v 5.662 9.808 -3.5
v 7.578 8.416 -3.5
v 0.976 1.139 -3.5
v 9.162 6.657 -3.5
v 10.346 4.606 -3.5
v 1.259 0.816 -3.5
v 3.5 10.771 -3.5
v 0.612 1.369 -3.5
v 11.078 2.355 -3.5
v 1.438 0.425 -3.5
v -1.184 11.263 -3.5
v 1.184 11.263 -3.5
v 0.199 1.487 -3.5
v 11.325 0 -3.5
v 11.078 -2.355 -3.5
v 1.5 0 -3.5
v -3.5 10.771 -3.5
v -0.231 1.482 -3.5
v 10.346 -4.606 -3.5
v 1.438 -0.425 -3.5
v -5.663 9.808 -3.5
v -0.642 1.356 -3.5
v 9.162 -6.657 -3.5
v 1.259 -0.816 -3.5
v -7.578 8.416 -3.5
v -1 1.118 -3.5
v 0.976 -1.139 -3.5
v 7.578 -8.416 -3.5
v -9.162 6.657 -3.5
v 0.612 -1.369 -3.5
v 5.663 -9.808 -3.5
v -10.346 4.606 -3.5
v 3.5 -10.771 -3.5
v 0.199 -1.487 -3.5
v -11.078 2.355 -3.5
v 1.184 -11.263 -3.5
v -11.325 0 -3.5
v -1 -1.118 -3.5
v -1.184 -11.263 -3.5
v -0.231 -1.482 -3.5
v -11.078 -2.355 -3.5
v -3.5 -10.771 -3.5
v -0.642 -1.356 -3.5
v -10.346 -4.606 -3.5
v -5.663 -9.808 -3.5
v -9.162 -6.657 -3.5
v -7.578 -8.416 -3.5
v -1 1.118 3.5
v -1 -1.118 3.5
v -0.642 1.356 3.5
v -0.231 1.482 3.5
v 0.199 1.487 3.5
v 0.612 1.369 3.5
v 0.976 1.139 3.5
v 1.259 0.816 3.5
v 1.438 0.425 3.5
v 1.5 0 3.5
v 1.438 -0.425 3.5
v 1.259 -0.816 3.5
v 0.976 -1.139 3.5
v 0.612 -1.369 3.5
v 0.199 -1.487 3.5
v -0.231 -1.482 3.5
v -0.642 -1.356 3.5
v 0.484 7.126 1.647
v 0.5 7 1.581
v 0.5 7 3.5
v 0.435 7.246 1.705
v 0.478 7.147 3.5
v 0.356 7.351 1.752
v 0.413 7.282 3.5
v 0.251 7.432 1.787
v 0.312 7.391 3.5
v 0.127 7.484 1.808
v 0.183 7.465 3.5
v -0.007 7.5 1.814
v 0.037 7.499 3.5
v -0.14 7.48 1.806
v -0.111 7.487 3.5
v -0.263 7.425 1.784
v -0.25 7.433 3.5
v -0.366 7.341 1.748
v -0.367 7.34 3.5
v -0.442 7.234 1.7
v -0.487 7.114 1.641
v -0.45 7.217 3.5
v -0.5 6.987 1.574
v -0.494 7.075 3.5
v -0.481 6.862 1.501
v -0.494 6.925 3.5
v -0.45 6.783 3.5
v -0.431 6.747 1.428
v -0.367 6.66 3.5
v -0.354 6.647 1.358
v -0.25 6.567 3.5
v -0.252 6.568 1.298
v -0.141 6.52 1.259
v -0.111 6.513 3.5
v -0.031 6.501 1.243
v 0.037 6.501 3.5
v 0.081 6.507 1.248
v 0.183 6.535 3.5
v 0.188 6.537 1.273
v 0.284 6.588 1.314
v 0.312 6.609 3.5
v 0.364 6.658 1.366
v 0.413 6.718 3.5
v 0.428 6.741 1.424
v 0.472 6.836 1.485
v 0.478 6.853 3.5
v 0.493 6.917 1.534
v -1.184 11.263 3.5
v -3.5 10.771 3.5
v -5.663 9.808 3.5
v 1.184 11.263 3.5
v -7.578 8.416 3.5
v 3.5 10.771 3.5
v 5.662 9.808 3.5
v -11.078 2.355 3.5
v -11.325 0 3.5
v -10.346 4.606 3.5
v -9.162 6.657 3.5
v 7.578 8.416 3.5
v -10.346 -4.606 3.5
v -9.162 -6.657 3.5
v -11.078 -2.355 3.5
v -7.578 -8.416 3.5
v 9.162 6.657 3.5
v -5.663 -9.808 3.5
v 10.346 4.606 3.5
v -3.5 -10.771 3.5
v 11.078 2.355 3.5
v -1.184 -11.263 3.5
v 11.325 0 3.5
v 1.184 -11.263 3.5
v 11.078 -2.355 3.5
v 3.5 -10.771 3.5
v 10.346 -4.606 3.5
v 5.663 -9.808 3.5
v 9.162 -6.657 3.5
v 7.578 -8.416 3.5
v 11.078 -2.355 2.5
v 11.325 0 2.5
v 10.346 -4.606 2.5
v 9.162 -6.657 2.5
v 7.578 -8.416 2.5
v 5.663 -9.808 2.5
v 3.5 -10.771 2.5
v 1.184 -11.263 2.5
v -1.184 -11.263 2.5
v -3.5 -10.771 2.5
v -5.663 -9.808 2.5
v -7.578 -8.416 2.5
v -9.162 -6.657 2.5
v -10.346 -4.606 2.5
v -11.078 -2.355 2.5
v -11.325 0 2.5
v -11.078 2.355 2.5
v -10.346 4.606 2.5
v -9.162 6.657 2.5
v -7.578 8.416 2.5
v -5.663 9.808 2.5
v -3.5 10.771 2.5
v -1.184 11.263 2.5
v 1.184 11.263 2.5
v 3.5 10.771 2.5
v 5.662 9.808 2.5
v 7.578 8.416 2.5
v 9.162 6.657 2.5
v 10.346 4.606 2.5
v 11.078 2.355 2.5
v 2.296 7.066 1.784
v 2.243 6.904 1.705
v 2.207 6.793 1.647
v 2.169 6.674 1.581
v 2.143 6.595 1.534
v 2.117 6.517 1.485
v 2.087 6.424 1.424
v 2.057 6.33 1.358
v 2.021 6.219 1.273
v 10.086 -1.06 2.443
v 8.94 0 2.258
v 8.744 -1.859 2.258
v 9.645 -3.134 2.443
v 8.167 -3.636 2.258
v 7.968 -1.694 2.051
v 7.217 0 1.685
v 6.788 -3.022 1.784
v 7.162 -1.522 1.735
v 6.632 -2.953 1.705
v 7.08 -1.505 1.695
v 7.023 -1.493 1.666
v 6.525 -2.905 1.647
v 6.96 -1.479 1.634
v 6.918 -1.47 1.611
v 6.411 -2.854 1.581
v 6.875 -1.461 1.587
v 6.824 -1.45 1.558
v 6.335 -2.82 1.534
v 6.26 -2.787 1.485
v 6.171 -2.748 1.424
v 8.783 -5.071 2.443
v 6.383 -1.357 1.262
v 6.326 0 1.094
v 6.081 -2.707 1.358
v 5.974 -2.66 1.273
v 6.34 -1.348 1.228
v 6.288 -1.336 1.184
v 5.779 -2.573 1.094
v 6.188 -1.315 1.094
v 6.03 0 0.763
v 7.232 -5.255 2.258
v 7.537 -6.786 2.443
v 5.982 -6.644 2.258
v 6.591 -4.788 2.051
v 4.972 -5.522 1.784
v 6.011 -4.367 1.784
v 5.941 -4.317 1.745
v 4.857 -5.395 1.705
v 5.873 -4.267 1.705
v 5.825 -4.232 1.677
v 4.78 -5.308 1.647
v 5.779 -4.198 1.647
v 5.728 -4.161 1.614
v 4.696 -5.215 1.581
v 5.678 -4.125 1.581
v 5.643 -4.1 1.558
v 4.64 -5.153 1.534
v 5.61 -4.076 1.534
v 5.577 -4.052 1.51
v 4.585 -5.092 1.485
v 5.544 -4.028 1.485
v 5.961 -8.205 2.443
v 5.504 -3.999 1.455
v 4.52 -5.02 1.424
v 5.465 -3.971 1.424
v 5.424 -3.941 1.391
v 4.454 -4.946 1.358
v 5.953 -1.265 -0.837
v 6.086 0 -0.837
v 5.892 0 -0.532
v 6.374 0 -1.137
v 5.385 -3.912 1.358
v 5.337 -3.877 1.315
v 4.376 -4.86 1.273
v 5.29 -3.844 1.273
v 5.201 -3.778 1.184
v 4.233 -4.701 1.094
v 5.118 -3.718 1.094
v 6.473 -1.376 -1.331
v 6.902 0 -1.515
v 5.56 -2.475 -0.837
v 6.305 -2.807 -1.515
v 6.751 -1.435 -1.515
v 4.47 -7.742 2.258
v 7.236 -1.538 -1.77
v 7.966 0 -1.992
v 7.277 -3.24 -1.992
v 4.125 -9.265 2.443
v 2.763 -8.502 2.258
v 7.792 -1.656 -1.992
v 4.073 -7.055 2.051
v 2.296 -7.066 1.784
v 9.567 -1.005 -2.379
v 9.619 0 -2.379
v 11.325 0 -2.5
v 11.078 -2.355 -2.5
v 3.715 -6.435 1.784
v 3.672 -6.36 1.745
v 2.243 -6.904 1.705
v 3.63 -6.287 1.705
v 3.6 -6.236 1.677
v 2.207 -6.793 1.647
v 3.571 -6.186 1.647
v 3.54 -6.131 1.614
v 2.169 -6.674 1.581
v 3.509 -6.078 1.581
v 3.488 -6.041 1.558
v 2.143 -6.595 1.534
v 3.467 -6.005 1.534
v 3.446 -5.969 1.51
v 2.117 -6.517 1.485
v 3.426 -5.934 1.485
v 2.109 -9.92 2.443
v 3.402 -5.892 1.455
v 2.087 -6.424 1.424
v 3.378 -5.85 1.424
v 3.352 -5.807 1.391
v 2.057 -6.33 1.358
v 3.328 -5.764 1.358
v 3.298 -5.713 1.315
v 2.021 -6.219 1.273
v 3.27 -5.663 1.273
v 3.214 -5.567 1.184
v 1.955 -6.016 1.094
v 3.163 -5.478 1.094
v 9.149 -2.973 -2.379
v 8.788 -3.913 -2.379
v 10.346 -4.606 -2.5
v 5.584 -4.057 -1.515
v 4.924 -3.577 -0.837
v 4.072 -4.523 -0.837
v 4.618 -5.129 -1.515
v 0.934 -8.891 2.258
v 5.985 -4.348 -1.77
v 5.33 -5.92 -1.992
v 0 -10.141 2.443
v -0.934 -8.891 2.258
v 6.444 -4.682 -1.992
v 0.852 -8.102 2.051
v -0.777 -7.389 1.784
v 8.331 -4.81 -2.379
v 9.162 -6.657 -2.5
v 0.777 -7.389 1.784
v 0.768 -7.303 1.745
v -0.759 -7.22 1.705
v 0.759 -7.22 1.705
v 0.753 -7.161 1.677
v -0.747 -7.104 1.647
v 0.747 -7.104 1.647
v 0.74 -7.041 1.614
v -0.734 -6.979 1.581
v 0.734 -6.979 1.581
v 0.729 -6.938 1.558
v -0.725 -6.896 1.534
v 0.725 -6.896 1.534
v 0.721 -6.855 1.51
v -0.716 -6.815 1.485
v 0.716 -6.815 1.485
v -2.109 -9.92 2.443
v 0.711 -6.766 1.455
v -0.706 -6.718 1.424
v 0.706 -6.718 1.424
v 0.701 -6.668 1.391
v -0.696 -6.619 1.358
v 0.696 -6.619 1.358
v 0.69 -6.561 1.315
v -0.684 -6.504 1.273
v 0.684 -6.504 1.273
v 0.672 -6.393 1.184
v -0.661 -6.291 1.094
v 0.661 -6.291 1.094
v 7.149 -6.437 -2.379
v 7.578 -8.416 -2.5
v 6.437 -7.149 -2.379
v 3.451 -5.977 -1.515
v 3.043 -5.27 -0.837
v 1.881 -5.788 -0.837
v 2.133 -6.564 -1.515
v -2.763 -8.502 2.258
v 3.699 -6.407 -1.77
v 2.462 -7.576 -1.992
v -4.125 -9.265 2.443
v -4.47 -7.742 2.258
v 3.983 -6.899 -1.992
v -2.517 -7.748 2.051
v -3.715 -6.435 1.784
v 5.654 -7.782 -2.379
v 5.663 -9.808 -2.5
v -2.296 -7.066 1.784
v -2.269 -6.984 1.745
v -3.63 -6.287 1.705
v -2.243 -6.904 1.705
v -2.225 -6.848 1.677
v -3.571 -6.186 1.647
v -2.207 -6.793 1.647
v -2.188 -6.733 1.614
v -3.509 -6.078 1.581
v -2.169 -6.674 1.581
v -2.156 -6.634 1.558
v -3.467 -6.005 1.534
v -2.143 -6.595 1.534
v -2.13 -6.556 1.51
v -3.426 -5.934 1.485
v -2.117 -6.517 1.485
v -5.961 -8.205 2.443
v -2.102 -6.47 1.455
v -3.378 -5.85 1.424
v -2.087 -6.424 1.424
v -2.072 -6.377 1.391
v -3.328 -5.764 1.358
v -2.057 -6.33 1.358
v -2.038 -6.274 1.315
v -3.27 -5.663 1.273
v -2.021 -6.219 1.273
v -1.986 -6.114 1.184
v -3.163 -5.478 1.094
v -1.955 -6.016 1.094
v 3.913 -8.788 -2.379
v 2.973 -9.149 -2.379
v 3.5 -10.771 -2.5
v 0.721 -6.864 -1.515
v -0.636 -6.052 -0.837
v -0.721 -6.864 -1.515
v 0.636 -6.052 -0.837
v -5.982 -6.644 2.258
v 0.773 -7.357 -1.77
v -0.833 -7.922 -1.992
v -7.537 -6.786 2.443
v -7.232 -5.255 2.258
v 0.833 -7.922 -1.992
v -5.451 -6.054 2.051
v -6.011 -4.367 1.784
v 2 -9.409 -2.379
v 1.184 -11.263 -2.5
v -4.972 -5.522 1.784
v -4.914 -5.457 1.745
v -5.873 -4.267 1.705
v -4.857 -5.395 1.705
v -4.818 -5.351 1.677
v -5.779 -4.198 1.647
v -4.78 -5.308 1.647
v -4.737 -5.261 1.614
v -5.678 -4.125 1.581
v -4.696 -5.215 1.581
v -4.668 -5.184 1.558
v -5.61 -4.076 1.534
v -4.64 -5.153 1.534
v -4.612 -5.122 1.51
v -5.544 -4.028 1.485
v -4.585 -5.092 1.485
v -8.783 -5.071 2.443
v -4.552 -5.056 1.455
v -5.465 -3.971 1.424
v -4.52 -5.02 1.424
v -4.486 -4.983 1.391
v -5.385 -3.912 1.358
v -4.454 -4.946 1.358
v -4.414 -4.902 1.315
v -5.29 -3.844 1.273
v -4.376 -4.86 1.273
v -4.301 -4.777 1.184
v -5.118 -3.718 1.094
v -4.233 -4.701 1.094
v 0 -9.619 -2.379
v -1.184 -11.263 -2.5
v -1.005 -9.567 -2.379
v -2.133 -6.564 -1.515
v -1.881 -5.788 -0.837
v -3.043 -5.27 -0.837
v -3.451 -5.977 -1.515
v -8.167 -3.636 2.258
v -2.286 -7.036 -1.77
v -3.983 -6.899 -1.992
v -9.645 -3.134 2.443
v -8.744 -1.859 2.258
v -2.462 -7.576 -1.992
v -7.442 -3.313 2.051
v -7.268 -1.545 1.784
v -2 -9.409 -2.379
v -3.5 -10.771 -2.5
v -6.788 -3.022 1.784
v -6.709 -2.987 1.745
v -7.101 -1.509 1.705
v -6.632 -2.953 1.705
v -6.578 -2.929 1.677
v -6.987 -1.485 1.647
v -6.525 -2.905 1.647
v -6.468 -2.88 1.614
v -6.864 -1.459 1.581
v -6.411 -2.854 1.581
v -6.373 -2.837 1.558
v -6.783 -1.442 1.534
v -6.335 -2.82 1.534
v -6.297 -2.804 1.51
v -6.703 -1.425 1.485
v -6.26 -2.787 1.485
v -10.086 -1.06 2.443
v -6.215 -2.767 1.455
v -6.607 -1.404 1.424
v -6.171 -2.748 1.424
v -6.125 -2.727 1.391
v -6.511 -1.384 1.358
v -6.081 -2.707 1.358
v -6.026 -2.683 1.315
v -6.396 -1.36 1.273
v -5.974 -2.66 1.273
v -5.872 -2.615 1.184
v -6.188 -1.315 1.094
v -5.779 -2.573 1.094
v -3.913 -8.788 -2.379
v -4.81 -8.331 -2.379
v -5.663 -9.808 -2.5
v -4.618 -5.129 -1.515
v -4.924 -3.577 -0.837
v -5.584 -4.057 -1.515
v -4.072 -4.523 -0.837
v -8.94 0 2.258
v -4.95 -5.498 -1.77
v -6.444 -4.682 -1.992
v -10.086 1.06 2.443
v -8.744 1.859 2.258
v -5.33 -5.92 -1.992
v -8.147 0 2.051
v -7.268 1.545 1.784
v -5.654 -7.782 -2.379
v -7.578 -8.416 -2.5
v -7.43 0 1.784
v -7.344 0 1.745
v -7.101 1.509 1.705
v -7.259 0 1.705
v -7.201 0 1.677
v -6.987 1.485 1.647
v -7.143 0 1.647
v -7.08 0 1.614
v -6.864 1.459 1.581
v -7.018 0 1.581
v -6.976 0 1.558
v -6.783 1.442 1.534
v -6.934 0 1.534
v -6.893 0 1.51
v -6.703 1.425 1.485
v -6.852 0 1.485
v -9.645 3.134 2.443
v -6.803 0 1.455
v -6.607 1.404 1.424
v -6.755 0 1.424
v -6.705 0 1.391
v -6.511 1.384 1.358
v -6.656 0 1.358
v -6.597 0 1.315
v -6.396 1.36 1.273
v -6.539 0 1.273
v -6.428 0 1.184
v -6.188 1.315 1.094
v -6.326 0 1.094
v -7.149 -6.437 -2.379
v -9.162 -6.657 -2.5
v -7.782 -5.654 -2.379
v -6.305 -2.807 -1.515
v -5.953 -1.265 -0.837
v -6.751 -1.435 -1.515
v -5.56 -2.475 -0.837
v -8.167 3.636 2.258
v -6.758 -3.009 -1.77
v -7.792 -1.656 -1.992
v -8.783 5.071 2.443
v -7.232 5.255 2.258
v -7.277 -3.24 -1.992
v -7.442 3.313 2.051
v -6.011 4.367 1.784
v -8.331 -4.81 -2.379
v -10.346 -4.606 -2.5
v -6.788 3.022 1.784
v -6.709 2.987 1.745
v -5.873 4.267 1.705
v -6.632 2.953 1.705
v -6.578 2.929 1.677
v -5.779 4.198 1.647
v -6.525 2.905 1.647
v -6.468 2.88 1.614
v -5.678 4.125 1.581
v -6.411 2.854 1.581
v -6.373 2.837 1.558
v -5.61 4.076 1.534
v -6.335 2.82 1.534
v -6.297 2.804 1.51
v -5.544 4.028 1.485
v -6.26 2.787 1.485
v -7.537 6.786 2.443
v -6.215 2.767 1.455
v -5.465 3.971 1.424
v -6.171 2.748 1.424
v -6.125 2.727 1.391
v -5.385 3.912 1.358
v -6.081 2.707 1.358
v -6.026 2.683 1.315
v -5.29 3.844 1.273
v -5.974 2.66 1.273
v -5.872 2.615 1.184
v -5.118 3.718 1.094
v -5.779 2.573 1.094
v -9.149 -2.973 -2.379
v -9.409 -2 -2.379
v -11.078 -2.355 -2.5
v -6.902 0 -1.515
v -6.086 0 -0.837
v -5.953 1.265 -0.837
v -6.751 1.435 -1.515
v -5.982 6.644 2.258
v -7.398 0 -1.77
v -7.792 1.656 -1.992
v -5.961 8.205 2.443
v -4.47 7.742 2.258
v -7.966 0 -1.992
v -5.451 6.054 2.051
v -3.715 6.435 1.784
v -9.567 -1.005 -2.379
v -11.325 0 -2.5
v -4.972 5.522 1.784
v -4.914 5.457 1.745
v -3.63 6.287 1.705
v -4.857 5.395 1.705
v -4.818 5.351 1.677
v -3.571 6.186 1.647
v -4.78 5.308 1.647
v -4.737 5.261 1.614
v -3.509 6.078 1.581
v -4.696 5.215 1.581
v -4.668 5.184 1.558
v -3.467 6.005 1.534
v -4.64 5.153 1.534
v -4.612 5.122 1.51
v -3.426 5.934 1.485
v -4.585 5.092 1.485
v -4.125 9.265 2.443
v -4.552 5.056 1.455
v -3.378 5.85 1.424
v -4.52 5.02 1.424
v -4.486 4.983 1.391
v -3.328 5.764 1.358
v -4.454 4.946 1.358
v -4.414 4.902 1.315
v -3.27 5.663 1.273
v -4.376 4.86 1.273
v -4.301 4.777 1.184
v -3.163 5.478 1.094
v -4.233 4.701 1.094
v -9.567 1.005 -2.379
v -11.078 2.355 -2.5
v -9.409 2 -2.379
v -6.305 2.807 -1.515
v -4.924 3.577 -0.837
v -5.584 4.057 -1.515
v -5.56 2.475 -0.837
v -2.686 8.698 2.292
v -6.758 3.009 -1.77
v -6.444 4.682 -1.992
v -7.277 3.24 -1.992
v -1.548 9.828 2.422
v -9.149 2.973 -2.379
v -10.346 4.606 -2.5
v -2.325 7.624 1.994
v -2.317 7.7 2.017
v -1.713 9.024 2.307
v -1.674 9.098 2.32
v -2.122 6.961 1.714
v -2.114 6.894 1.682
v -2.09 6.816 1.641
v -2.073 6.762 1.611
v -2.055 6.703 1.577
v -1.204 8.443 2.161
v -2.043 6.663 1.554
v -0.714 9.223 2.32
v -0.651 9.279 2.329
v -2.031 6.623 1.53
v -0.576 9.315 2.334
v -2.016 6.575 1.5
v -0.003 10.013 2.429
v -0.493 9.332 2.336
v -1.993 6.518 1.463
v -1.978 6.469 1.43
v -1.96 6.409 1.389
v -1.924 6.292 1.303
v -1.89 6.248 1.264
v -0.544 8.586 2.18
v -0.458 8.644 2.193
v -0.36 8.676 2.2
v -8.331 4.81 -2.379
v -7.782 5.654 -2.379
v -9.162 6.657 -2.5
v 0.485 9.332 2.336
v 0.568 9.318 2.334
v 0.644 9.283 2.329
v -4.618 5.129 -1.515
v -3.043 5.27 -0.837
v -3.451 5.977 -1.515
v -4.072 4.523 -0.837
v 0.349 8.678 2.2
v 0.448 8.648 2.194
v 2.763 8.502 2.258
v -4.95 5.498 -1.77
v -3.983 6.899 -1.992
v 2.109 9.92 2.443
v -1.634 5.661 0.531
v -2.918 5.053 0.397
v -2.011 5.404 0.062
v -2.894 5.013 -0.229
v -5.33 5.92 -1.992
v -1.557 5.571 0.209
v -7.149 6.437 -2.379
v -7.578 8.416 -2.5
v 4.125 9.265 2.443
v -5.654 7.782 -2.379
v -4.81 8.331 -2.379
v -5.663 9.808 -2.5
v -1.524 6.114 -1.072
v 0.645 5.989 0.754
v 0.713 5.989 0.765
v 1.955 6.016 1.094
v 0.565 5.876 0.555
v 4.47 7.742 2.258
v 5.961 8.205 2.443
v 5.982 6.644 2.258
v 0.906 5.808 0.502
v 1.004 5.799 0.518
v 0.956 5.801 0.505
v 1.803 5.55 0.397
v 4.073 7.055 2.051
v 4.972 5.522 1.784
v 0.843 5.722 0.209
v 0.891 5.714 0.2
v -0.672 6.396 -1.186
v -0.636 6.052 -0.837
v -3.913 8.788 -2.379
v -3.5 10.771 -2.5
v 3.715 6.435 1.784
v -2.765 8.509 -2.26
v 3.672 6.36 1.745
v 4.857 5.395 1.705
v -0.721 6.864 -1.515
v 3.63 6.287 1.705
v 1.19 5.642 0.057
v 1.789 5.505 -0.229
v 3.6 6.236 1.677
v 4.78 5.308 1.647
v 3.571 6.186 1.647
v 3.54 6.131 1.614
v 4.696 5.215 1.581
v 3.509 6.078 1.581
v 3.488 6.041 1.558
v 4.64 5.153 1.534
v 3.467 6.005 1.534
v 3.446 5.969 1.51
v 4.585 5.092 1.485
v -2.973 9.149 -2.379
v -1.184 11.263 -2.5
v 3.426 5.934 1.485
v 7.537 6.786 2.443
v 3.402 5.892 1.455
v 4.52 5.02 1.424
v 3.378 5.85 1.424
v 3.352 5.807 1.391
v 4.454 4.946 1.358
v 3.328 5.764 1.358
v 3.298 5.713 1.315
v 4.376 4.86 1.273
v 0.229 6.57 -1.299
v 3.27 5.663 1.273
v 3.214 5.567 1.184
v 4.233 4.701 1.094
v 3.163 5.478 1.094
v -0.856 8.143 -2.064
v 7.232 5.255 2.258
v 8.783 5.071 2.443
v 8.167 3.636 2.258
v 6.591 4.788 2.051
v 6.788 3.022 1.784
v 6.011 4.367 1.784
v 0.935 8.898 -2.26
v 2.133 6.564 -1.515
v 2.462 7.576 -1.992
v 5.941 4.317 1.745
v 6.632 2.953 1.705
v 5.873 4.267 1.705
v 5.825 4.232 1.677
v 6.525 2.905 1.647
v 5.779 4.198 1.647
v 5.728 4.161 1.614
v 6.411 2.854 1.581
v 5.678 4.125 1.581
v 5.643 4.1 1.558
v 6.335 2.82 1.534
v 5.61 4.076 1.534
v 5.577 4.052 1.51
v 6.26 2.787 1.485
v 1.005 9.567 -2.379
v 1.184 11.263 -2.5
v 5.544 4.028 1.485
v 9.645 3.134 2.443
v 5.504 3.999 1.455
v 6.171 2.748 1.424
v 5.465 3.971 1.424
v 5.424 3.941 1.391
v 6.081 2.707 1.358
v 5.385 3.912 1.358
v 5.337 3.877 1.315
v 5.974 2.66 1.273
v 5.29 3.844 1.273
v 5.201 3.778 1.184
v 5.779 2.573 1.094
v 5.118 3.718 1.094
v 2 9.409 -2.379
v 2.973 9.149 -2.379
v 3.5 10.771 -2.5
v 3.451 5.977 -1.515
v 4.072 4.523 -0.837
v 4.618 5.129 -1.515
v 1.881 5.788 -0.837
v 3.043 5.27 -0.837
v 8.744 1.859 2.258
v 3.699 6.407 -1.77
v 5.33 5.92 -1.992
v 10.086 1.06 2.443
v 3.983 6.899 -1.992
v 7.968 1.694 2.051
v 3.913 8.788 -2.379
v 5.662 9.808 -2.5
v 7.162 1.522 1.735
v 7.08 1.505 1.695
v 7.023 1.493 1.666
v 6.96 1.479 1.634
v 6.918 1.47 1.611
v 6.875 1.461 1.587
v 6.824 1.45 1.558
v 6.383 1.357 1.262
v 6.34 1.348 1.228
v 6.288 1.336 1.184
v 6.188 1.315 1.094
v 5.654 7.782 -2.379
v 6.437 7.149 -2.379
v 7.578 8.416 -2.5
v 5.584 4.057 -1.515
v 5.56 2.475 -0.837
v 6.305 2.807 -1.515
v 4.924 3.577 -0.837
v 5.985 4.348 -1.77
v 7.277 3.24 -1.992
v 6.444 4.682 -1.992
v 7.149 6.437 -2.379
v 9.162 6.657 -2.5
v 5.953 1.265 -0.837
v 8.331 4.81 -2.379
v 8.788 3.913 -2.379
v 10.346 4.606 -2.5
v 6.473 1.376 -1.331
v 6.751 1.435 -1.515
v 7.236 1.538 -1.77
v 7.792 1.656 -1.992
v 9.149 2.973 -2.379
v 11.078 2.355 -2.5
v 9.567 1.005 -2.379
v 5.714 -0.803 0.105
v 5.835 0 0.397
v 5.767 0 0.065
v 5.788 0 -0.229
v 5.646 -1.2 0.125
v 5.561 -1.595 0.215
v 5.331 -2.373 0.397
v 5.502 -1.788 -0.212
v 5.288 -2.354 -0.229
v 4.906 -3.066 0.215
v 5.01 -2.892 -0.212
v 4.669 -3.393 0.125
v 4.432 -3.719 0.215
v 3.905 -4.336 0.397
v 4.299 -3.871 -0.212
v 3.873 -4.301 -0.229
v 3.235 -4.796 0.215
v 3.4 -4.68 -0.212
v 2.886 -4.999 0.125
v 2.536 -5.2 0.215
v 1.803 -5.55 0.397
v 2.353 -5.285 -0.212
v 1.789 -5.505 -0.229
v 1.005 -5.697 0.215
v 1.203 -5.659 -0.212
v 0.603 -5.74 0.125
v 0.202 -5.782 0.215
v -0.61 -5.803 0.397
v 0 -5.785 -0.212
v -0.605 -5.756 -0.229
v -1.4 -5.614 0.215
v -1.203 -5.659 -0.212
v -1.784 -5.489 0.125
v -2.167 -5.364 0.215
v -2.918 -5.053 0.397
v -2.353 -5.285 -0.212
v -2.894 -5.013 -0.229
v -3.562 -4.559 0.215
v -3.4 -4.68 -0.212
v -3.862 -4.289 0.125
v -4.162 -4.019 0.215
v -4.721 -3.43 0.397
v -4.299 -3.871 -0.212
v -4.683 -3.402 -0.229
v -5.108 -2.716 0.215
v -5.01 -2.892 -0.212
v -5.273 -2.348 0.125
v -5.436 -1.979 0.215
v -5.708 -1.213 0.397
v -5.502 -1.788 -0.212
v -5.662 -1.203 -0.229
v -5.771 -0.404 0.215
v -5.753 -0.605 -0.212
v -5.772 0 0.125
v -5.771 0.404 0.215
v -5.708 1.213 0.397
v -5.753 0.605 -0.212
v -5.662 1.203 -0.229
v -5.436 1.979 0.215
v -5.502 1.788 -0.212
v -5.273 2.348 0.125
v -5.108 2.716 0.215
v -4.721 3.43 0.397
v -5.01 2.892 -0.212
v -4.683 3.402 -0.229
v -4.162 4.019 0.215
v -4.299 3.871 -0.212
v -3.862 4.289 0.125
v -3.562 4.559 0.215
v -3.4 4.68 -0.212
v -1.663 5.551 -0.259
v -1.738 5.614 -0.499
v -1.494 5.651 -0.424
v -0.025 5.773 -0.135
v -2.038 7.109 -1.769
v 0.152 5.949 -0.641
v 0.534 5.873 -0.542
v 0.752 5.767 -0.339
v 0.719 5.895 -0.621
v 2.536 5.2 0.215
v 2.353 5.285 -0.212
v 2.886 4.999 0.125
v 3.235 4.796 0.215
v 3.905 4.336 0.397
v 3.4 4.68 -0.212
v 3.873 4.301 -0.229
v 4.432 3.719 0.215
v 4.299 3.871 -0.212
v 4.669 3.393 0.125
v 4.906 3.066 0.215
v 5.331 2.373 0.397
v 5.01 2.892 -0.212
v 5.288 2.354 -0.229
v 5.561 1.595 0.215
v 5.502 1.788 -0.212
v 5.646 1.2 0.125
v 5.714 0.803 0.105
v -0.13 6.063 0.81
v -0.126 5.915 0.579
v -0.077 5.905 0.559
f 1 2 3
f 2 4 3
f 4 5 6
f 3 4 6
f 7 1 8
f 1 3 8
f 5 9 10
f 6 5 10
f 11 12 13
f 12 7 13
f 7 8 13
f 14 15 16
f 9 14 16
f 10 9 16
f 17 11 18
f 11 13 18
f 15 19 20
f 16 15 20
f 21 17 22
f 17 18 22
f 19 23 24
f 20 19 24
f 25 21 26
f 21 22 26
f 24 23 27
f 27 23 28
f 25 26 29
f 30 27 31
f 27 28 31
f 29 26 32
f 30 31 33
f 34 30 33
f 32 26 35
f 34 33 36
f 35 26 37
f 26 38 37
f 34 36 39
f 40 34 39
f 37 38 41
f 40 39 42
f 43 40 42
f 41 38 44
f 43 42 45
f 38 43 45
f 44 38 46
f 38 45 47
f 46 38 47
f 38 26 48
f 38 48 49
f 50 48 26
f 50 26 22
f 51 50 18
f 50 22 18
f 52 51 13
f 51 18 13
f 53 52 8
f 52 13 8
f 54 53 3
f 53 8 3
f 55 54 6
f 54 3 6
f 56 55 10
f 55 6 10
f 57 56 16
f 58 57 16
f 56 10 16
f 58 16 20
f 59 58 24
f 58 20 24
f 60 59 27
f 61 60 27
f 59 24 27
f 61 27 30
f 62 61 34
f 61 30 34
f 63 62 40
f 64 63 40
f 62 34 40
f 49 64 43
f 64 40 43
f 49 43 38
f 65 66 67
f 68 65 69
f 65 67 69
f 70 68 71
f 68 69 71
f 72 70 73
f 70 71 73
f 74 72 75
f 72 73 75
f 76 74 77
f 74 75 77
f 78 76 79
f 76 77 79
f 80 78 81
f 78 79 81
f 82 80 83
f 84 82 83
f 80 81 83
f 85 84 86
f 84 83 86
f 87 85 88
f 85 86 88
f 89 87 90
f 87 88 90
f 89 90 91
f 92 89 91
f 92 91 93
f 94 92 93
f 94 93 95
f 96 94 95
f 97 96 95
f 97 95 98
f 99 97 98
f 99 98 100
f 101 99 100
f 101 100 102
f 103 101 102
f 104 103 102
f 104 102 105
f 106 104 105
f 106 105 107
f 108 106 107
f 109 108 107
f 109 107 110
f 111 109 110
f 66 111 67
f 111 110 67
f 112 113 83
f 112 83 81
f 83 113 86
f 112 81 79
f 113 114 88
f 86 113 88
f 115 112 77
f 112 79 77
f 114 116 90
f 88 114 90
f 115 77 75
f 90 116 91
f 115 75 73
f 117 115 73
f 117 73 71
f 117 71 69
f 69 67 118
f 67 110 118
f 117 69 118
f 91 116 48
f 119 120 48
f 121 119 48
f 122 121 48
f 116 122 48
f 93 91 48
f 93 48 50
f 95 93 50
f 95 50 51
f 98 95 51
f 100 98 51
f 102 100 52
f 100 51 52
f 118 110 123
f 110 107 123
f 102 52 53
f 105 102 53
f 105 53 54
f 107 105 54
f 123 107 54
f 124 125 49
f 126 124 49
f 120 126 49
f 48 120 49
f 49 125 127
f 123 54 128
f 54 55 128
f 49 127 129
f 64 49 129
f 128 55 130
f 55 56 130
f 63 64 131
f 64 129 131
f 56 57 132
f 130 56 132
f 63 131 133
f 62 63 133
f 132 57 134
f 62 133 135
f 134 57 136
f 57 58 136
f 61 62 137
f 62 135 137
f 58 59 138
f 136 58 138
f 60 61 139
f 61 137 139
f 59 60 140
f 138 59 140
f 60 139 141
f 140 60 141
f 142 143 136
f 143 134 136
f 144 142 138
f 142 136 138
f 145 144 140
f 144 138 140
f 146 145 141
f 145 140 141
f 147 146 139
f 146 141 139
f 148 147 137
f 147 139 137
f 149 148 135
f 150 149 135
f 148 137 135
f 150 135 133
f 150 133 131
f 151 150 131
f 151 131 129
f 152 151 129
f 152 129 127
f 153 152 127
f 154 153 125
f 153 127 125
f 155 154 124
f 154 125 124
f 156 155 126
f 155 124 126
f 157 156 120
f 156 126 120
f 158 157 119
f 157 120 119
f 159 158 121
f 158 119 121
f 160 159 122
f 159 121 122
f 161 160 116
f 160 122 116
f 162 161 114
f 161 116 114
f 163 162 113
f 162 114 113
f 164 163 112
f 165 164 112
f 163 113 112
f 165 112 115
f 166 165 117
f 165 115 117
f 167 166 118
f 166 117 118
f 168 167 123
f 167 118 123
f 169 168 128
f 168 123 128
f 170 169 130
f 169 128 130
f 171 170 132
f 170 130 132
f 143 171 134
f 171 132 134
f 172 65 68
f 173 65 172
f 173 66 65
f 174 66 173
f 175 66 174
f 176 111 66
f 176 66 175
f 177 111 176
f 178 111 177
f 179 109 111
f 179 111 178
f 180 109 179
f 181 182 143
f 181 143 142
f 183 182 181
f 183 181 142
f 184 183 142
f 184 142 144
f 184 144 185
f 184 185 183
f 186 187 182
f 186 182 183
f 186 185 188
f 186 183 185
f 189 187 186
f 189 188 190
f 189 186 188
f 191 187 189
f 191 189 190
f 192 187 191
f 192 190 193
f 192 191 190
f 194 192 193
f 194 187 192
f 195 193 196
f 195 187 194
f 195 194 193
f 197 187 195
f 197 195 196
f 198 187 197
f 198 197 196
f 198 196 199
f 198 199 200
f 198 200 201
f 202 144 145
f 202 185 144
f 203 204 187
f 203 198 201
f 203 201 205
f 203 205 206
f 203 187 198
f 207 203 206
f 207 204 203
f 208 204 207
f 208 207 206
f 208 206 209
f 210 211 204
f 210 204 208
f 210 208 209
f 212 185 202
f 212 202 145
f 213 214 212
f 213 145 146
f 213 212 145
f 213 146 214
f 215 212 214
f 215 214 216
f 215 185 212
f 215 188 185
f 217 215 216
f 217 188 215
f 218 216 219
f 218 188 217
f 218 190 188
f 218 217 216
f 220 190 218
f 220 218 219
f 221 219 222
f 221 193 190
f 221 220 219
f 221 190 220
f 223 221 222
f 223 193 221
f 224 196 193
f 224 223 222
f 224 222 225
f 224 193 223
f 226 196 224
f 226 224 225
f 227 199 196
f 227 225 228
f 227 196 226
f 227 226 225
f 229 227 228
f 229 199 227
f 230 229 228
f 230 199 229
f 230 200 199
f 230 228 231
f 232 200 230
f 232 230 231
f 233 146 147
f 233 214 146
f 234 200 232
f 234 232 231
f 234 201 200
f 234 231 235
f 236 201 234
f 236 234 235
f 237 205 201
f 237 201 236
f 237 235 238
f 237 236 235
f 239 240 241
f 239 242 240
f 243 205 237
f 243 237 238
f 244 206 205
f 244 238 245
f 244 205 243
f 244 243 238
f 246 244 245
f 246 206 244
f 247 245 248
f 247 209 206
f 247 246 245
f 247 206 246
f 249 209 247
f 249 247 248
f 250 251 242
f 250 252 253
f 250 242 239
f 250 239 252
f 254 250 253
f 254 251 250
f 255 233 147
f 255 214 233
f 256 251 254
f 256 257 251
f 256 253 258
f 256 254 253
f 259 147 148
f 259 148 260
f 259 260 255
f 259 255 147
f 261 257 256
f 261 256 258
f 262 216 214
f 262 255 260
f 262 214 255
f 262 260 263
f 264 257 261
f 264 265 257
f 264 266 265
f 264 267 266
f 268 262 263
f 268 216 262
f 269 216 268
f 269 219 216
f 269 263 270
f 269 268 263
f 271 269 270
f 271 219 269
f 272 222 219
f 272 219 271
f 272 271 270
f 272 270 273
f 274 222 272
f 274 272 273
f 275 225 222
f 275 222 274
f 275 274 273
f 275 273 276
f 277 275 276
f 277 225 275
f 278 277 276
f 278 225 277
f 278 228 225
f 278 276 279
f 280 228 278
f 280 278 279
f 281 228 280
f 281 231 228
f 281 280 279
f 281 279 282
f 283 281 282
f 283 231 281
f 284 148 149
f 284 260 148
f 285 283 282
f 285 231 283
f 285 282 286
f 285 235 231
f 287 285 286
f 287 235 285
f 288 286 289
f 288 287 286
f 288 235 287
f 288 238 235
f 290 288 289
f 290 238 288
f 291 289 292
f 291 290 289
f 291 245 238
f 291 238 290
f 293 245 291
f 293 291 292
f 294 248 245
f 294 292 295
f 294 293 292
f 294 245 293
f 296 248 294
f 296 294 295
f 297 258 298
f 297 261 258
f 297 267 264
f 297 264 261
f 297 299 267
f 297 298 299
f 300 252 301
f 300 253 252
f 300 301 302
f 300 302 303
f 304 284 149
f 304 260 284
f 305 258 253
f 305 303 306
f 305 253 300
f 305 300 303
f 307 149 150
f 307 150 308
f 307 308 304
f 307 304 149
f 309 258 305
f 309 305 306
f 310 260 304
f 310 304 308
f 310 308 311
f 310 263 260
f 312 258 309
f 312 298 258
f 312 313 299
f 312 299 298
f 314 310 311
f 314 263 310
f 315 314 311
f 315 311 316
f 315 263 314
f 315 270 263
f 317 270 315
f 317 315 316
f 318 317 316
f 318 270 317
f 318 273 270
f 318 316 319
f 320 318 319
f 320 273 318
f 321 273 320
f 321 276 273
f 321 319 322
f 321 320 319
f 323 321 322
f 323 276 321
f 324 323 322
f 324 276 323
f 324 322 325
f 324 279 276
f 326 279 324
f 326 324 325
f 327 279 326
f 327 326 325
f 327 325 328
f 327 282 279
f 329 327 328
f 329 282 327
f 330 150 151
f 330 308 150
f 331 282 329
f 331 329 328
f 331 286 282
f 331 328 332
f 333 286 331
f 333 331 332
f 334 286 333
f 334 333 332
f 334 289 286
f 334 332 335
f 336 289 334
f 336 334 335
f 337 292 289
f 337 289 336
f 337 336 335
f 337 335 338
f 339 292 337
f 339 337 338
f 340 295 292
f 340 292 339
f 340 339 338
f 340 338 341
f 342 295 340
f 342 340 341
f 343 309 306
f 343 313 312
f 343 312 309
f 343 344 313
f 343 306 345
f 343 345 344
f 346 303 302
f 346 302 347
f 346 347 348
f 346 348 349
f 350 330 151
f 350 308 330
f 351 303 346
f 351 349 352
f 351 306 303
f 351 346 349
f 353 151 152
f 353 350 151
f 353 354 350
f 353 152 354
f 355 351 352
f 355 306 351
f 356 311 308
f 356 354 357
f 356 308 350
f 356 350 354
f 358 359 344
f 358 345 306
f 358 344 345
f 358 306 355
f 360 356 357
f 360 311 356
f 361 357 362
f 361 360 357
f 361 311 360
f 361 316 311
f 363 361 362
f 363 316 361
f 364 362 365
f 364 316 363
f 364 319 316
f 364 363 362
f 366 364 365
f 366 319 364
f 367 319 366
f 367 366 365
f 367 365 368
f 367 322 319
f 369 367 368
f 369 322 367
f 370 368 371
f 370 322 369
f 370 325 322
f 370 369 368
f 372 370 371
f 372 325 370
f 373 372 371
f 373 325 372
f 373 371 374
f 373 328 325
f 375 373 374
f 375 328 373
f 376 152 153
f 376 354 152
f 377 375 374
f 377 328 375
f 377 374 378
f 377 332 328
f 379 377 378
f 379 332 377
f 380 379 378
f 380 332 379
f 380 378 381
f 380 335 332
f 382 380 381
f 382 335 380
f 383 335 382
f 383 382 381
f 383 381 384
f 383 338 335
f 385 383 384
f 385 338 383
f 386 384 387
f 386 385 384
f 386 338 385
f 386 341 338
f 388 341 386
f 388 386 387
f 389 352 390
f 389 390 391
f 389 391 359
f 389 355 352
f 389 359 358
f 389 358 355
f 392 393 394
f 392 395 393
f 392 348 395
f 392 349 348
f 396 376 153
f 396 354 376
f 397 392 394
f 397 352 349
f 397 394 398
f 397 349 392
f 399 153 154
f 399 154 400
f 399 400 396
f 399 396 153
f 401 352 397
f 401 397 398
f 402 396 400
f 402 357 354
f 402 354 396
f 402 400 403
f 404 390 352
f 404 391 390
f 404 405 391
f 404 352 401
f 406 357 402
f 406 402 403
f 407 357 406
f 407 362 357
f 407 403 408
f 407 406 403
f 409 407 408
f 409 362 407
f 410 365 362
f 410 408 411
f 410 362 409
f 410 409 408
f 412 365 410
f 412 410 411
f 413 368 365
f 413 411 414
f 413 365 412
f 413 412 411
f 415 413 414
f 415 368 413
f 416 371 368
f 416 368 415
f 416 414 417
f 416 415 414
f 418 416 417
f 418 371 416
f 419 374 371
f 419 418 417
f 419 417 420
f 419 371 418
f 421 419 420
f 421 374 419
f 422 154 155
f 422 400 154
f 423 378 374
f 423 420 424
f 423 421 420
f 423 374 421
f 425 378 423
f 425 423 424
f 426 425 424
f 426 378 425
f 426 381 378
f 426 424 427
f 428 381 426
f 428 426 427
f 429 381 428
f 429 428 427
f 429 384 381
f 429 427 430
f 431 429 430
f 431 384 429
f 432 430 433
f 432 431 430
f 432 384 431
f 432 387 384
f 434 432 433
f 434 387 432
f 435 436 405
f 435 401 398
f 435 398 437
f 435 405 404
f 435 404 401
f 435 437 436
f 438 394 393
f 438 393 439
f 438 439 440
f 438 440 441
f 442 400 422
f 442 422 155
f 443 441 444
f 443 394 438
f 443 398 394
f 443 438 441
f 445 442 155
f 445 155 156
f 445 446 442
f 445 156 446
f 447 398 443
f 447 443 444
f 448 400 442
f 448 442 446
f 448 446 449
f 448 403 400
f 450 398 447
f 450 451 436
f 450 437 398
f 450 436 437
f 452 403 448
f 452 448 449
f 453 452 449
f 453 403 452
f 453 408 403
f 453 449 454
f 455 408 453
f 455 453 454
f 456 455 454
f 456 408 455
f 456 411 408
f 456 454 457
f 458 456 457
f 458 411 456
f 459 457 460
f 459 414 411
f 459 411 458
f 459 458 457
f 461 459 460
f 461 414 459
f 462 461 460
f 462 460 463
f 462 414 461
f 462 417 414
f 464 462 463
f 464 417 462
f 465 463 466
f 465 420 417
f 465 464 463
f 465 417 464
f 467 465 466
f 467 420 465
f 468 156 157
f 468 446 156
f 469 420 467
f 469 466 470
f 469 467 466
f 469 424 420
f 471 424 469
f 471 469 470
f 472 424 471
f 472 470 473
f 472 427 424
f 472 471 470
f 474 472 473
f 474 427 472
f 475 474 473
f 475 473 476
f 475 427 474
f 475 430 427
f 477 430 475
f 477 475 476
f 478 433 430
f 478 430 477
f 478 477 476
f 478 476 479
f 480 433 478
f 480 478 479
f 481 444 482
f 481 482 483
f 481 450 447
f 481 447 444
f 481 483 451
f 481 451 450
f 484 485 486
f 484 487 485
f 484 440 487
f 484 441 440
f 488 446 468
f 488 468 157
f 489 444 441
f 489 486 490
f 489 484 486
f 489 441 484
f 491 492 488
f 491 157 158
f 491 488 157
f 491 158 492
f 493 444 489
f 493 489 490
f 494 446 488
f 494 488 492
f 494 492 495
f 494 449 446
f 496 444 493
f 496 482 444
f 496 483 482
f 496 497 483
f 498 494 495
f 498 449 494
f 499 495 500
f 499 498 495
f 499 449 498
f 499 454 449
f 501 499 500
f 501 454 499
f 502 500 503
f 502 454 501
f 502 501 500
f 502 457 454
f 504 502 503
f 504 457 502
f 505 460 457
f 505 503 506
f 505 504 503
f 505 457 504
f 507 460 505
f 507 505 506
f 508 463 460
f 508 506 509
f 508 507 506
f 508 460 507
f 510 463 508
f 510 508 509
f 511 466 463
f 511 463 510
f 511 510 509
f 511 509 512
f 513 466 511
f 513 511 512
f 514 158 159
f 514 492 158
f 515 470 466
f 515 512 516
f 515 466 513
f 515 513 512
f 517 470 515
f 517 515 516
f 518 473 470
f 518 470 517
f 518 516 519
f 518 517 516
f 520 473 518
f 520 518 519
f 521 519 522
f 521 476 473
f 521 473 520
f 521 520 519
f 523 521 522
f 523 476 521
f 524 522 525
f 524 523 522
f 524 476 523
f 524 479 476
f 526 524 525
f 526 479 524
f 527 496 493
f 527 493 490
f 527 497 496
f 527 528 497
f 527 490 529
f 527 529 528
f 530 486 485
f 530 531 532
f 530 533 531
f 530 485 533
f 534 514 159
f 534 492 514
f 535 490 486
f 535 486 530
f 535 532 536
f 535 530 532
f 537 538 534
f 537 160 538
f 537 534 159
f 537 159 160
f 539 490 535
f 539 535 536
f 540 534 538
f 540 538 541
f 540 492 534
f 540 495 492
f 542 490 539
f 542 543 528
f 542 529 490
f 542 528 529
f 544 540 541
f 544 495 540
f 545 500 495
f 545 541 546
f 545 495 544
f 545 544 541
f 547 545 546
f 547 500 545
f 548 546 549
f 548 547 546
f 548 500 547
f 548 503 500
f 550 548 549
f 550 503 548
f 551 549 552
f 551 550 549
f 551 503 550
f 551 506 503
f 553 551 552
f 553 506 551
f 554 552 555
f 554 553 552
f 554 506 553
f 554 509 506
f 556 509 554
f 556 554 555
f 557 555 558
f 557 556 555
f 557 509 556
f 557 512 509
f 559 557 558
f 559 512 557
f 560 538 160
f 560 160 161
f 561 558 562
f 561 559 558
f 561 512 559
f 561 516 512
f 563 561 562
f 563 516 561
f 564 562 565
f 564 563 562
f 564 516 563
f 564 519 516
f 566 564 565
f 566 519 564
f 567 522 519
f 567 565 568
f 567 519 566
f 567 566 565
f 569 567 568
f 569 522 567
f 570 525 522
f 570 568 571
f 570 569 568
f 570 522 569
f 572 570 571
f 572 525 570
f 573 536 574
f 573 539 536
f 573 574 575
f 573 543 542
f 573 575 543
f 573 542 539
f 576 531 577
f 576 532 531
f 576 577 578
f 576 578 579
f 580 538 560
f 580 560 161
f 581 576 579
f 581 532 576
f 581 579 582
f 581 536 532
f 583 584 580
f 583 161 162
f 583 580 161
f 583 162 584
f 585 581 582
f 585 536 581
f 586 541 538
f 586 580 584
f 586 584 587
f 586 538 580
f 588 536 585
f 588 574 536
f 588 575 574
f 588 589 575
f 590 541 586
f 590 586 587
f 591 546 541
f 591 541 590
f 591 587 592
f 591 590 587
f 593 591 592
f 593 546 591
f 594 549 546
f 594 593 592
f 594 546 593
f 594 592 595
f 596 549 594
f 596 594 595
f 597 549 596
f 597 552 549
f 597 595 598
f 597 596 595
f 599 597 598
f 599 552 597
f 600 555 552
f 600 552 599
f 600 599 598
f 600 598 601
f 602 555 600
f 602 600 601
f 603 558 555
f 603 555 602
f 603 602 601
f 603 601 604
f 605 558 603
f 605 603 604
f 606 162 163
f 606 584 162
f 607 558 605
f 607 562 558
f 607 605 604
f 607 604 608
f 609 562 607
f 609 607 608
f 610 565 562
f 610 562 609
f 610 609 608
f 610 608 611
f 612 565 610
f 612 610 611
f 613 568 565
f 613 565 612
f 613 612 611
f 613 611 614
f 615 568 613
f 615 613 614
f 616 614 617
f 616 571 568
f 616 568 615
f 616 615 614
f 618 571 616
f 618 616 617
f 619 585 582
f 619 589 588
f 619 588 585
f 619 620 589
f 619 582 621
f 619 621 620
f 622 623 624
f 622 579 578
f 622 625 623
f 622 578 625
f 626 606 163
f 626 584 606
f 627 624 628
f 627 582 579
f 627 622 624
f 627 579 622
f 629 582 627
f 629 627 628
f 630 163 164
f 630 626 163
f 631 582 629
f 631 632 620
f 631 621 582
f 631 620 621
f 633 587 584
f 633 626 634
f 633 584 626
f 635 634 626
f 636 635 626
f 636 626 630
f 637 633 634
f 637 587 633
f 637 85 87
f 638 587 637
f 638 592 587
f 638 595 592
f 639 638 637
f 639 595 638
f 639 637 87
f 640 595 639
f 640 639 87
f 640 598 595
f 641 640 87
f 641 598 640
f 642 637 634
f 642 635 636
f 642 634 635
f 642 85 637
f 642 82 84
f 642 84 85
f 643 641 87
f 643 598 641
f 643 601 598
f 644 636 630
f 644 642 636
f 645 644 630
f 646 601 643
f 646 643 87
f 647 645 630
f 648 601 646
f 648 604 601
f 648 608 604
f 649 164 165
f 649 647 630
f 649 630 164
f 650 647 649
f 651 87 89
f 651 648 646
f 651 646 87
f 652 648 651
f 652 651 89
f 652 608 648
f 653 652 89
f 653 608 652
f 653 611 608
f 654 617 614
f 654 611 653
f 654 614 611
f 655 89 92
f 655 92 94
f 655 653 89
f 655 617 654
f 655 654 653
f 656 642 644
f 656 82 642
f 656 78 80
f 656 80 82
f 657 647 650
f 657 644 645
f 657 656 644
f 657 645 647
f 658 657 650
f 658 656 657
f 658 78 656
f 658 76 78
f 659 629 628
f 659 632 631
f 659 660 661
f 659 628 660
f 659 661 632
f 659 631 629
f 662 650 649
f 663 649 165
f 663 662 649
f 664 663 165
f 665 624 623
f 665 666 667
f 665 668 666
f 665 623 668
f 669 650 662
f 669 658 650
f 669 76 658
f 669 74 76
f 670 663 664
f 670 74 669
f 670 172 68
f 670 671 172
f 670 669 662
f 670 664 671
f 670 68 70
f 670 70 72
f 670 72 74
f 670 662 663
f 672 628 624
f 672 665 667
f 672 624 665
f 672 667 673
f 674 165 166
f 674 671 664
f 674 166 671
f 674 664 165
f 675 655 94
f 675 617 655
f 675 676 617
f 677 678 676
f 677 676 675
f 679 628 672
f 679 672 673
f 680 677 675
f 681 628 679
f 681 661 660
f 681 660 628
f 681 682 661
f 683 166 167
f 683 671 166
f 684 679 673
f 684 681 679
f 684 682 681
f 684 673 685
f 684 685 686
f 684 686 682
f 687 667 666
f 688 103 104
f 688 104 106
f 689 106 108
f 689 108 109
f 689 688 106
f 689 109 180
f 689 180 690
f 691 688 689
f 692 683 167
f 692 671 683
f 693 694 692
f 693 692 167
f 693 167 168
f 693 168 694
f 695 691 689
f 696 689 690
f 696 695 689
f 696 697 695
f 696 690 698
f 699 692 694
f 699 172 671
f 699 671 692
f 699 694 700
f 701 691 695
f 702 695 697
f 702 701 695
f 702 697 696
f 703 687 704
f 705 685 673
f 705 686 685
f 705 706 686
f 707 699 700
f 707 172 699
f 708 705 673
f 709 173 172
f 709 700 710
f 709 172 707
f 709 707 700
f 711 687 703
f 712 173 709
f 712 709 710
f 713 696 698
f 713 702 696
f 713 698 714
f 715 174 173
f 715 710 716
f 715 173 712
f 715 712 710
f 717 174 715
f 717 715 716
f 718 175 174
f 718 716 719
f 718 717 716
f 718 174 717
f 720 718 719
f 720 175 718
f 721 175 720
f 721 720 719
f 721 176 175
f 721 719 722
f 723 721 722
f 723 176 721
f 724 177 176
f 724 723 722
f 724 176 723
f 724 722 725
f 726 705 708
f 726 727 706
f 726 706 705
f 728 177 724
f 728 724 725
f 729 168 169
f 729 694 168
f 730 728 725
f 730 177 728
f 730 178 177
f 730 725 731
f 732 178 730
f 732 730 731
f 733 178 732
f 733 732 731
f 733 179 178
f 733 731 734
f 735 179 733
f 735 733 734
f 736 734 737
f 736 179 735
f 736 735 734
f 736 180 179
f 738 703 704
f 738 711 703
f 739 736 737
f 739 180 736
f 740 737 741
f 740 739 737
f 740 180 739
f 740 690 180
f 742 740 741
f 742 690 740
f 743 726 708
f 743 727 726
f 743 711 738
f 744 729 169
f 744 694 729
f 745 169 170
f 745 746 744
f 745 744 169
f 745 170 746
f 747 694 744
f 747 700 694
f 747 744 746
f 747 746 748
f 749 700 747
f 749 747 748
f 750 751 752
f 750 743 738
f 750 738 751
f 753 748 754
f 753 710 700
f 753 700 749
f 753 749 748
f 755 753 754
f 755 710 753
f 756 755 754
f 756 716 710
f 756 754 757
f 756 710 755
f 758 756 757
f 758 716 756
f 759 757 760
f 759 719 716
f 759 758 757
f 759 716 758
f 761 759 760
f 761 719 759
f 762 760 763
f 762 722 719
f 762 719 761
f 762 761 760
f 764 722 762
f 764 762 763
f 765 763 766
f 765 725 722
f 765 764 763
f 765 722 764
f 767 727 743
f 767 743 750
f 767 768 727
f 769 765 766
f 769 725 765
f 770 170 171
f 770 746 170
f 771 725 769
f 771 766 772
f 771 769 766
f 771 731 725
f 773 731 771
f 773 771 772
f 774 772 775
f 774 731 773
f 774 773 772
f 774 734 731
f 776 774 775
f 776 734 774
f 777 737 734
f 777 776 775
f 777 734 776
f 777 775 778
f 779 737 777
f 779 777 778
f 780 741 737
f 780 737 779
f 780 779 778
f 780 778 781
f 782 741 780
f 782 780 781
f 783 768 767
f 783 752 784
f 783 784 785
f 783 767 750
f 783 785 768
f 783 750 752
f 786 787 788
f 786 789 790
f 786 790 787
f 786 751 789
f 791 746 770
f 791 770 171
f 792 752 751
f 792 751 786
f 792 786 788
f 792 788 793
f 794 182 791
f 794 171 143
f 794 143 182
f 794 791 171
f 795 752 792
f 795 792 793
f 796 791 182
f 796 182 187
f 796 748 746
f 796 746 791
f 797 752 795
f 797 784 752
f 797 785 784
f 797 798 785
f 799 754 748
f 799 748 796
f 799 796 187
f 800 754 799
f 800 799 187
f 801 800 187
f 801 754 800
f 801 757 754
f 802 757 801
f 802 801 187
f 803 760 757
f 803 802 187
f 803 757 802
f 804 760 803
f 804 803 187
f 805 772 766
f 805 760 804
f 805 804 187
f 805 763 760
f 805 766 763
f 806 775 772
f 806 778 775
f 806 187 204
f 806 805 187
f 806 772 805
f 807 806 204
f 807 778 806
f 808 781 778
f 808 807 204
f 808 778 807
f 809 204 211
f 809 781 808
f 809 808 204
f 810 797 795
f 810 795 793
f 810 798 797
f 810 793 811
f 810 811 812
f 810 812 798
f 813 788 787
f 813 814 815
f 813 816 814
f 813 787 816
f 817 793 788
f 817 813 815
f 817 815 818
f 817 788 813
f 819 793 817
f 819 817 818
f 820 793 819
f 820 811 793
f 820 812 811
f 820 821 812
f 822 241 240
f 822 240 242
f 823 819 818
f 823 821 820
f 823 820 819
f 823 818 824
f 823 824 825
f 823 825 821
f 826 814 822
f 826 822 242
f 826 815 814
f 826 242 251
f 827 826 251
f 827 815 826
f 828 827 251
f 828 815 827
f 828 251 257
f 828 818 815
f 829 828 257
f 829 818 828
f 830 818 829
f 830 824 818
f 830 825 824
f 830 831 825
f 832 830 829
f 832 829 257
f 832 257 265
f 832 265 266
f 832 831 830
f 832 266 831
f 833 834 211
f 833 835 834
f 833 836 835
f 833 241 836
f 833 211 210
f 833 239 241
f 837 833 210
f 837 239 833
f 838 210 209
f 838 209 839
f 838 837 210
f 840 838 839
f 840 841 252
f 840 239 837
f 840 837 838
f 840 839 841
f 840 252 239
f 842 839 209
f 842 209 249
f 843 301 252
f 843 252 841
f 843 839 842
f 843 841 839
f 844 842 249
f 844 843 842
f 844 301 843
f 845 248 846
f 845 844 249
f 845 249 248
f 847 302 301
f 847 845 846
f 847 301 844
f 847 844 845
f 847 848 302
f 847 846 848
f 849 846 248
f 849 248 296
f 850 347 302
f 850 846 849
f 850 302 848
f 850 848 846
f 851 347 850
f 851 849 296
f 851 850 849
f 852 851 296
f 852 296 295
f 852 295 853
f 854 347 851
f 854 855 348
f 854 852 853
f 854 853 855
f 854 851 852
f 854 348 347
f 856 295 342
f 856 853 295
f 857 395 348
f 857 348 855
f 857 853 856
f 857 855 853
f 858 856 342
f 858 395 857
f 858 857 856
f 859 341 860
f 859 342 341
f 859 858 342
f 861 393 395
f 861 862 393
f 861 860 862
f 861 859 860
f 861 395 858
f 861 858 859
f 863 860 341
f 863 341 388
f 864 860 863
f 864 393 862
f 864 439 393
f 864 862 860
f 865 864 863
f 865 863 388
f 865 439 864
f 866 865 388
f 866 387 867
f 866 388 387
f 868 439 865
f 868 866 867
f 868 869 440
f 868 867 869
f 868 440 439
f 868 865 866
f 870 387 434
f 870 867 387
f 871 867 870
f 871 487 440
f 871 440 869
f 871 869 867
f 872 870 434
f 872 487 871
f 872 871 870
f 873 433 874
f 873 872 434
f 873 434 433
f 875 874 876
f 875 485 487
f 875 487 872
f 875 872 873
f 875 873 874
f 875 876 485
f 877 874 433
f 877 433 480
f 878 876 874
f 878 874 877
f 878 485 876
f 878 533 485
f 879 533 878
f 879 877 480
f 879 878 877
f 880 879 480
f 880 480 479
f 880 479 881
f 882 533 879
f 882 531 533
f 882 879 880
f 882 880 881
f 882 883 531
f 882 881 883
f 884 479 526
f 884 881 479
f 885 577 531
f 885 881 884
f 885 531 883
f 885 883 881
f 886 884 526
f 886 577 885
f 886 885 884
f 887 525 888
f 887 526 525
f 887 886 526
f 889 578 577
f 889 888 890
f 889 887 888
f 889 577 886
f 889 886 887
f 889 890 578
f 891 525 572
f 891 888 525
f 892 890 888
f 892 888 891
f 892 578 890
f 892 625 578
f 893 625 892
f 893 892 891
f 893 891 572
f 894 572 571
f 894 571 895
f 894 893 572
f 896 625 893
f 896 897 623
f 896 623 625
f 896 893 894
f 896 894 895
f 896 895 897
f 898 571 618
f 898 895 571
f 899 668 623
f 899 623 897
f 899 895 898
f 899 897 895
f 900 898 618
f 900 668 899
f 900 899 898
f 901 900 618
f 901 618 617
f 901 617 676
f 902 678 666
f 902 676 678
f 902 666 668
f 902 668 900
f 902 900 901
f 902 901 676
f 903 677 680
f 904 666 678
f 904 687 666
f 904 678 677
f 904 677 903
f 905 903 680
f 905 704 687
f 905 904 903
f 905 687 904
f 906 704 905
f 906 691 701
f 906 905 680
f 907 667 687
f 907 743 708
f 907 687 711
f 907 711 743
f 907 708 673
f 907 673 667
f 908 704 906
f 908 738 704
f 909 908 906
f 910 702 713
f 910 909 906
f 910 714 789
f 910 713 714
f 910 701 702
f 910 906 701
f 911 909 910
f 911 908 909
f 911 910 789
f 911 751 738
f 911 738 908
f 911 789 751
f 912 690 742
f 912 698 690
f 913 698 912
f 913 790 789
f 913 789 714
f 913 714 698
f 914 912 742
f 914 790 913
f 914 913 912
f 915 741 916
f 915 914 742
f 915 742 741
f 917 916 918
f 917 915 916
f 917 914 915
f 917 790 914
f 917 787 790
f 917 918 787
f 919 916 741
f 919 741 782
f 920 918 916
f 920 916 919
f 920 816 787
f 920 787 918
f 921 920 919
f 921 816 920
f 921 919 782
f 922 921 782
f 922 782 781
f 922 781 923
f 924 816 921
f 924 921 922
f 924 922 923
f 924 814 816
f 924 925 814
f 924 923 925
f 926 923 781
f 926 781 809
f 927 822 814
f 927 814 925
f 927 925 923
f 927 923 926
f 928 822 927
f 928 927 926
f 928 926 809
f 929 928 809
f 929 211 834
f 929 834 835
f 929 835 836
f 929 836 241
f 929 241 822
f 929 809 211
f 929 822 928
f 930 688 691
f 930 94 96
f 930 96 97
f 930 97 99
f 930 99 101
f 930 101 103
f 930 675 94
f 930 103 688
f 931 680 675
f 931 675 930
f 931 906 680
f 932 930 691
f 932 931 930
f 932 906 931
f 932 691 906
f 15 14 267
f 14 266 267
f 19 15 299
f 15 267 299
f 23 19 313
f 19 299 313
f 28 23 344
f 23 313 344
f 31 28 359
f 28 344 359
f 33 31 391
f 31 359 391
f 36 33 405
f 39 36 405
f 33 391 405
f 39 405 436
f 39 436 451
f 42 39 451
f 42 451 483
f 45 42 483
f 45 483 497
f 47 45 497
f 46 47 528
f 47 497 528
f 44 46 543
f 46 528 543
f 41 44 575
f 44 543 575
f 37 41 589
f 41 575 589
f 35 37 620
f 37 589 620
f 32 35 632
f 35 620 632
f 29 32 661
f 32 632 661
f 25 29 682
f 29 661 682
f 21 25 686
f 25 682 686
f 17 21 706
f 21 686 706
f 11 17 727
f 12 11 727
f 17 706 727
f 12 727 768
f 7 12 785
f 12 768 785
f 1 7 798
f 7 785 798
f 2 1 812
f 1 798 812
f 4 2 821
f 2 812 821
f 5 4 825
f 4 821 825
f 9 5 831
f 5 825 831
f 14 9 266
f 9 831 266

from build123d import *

# Parameters (mm, degrees)
BOSS_EXTRUDE1_START = -7
BOSS_EXTRUDE1_DEPTH = 7
SKETCH8_R           = 0.5
CUT_EXTRUDE1_DEPTH  = 3


with BuildPart() as part:
    # Sketch4 → Revolve1 (revolve)
    with BuildSketch(Plane(origin=(0, 0, 0), x_dir=(0, 0, -1), z_dir=(1, 0, 0)), mode=Mode.PRIVATE) as revolve1_sk:
        with BuildLine():
            Line((-2.5, 11.325), (-3.5, 11.325))
            Line((-3.5, 11.325), (-3.5, 1.5))
            Line((-3.5, 1.5), (3.5, 1.5))
            Line((3.5, 1.5), (3.5, 11.325))
            Line((3.5, 11.325), (2.5, 11.325))
            add(Edge.make_bspline(
                [(-2.5, 11.325), (-2.5, 5.764829973), (0, 5.764829973), (2.5, 5.764829973), (2.5, 11.325)],
                knots=[1.570796327, 1.570796327, 1.570796327, 3.141592654, 3.141592654, 4.71238898, 4.71238898, 4.71238898], degree=2, weights=[1, 0.707106781, 1, 0.707106781, 1]))
        make_face()
    revolve(revolve1_sk.sketch.rotate(Axis((0, 0, 0), (0, 0, -1)), 90), axis=Axis((0, 0, 0), (0, 0, -1)))

    # Sketch7 → Boss-Extrude1 (add)
    with BuildSketch(Plane.XY.offset(3.5).offset(BOSS_EXTRUDE1_START)):
        with BuildLine():
            Line((-1, 1.118033989), (-1, -1.118033989))
            ThreePointArc((-1, -1.118033989), (-1.5, 0), (-1, 1.118033989))
        make_face()
    extrude(amount=BOSS_EXTRUDE1_DEPTH)

    # Sketch8 → Cut-Extrude1 (cut)
    with BuildSketch(Plane.XY.offset(3.5)):
        with Locations((0, 7)):
            Circle(SKETCH8_R)
    extrude(amount=-CUT_EXTRUDE1_DEPTH, mode=Mode.SUBTRACT)


solid = part.part
